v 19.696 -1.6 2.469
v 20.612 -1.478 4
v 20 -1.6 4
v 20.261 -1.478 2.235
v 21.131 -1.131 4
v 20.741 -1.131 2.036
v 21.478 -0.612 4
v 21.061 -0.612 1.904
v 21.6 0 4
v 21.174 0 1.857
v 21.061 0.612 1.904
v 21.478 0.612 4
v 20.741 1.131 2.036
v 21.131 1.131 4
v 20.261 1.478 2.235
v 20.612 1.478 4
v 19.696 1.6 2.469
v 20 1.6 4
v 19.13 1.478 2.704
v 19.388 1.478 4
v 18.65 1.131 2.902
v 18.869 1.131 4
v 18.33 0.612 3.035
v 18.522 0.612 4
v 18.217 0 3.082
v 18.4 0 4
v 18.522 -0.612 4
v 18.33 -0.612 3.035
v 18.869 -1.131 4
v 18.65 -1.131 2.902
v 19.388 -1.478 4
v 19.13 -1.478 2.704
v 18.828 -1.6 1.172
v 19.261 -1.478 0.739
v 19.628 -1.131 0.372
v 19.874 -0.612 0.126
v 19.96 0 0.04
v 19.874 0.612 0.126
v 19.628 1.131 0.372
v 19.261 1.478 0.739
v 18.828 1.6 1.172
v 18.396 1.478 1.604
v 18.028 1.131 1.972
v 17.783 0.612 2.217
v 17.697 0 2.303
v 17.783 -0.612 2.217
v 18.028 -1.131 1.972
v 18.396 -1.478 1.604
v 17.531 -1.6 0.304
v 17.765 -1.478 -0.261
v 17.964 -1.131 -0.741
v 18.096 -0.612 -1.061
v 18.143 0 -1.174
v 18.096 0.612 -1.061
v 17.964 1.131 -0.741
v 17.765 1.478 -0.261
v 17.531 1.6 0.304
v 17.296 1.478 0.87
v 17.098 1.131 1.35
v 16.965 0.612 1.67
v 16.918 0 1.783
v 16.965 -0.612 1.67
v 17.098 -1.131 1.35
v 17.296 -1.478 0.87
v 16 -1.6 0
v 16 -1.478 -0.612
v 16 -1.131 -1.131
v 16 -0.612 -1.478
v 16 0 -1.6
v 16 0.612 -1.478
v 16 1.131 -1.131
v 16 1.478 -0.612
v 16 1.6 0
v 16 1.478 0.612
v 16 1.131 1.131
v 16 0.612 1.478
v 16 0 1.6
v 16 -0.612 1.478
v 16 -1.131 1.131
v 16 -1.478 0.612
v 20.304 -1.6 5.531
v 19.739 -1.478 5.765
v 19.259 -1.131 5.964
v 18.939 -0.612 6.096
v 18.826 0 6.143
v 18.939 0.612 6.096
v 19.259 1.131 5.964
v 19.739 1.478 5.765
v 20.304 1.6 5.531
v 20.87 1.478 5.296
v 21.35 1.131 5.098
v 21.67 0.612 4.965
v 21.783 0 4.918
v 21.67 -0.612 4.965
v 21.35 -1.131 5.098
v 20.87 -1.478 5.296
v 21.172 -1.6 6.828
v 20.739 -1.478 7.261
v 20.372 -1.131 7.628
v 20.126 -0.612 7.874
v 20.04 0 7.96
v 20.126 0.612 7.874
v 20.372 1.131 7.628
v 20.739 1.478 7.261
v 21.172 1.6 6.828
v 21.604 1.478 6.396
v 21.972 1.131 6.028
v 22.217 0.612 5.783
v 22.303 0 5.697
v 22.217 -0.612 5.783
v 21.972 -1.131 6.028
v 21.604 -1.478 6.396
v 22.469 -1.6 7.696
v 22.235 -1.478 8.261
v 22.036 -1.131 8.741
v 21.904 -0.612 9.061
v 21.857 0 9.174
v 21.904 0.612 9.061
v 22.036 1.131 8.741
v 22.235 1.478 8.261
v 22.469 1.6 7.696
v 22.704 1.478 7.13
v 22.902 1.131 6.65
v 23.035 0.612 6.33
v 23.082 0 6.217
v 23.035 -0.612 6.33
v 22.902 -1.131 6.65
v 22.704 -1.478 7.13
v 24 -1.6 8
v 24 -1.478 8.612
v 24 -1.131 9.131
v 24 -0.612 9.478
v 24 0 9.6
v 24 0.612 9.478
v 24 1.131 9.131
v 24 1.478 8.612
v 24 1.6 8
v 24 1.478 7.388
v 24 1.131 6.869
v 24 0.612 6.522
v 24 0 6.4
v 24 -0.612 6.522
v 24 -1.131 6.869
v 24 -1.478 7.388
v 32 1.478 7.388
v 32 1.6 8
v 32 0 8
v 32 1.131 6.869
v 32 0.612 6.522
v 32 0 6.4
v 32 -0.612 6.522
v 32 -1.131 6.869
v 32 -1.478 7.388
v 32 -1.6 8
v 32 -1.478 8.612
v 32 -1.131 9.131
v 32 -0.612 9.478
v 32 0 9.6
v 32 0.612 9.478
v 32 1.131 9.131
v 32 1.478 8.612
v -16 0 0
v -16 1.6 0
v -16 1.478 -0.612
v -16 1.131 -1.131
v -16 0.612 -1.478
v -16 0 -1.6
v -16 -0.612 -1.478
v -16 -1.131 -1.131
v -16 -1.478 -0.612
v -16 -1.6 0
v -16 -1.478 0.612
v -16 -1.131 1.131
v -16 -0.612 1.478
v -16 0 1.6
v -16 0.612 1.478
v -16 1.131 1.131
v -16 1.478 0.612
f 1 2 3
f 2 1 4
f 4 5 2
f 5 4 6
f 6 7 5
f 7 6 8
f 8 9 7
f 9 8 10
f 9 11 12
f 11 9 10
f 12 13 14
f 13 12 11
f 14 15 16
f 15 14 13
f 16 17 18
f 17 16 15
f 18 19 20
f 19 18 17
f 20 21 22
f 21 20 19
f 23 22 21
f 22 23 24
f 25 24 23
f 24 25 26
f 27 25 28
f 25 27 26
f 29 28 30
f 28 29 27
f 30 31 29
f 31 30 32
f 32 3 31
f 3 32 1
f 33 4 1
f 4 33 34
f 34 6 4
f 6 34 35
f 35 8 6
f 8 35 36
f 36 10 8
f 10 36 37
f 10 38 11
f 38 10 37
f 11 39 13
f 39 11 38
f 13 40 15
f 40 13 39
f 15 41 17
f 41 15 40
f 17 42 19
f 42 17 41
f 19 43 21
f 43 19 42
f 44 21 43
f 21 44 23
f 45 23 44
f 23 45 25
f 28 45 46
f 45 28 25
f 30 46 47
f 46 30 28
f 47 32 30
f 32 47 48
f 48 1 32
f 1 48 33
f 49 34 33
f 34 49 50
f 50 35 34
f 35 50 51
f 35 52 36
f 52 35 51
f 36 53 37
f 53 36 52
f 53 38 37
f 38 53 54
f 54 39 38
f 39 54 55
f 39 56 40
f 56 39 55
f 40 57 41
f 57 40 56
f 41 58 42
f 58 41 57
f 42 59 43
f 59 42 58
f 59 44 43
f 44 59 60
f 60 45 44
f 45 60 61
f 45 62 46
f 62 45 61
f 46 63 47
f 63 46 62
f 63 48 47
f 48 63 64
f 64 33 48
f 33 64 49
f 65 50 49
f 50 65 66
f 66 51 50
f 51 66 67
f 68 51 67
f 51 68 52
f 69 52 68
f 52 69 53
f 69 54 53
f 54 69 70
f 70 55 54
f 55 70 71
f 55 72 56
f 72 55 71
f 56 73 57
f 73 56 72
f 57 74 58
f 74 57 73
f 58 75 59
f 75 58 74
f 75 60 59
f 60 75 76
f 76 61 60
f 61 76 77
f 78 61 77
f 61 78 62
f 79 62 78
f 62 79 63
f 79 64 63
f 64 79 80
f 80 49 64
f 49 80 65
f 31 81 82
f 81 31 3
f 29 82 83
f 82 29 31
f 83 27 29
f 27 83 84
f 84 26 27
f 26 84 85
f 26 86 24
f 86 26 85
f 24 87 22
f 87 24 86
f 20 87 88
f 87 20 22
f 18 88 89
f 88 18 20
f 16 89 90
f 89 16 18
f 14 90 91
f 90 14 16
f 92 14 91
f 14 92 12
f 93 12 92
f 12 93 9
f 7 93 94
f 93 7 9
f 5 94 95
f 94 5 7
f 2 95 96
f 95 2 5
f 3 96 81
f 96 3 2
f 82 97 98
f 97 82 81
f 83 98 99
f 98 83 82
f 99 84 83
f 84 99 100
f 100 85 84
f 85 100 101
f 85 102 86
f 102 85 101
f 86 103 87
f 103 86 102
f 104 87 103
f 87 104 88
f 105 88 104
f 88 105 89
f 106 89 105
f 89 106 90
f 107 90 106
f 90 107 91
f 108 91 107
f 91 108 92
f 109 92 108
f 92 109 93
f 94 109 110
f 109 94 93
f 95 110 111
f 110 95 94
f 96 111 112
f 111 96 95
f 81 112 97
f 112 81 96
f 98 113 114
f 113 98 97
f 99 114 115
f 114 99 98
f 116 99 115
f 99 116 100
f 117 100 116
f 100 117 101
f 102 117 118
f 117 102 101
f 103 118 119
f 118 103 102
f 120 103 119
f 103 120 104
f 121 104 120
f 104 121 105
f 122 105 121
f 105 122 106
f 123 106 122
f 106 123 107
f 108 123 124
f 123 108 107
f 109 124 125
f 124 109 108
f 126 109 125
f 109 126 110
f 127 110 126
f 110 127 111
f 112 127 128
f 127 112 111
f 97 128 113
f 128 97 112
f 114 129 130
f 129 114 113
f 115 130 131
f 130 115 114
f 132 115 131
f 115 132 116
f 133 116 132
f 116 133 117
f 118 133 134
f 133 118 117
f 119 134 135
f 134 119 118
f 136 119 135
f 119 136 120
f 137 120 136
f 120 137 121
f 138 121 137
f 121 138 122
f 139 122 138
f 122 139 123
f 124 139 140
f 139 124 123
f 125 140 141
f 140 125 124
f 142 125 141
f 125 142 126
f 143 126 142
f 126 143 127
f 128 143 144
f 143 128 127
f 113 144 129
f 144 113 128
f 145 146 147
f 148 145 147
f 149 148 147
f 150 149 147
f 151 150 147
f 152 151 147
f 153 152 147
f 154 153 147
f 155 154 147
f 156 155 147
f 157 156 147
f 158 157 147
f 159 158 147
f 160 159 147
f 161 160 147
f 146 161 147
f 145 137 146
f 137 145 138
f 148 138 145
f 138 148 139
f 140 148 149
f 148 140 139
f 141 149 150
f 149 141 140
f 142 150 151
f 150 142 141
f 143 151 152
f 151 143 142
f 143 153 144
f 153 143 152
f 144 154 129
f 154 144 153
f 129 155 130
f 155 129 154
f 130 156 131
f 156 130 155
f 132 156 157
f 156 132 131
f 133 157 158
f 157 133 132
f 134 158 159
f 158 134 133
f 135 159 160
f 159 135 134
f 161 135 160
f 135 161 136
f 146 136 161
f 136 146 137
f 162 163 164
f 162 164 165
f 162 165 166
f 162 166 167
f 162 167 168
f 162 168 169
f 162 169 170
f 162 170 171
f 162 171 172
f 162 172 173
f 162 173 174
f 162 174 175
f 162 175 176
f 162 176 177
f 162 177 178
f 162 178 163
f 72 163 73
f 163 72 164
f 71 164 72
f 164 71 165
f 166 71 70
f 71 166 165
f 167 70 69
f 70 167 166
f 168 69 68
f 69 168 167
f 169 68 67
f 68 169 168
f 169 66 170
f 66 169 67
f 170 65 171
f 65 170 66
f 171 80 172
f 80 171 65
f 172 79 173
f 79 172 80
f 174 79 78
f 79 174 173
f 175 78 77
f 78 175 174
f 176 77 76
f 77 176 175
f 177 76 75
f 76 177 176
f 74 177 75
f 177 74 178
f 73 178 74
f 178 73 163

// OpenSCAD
// file: ../p/4-4disc.scad
use <../lib.scad>
function ldraw_lib__4_4disc() = [
// 0 Disc 1.0
// 0 Name: 4-4disc.dat
// 0 Author: James Jessiman
// 0 !LDRAW_ORG Primitive UPDATE 2002-02
// 0 !LICENSE Licensed under CC BY 4.0 : see CAreadme.txt
// 
// 0 BFC CERTIFY CCW
  [0,"BFC","CERTIFY"],
  [0,"BFC","CCW"],
// 
// 0 !HISTORY 1998-12-15 [PTadmin] Official Update 1998-10
// 0 !HISTORY 2002-03-23 [sbliss] Added BFC statement
// 0 !HISTORY 2002-04-25 [PTadmin] Official Update 2002-02
// 0 !HISTORY 2007-06-24 [PTadmin] Header formatted for Contributor Agreement
// 0 !HISTORY 2008-07-01 [PTadmin] Official Update 2008-01
// 
// 
// 3 16 0 0 0 1 0 0 0.9239 0 0.3827
  [3,16,0,0,0,1,0,0,0.9239,0,0.3827],
// 3 16 0 0 0 0.9239 0 0.3827 0.7071 0 0.7071
  [3,16,0,0,0,0.9239,0,0.3827,0.7071,0,0.7071],
// 3 16 0 0 0 0.7071 0 0.7071 0.3827 0 0.9239
  [3,16,0,0,0,0.7071,0,0.7071,0.3827,0,0.9239],
// 3 16 0 0 0 0.3827 0 0.9239 0 0 1
  [3,16,0,0,0,0.3827,0,0.9239,0,0,1],
// 3 16 0 0 0 0 0 1 -0.3827 0 0.9239
  [3,16,0,0,0,0,0,1,-0.3827,0,0.9239],
// 3 16 0 0 0 -0.3827 0 0.9239 -0.7071 0 0.7071
  [3,16,0,0,0,-0.3827,0,0.9239,-0.7071,0,0.7071],
// 3 16 0 0 0 -0.7071 0 0.7071 -0.9239 0 0.3827
  [3,16,0,0,0,-0.7071,0,0.7071,-0.9239,0,0.3827],
// 3 16 0 0 0 -0.9239 0 0.3827 -1 0 -0
  [3,16,0,0,0,-0.9239,0,0.3827,-1,0,-0],
// 3 16 0 0 0 -1 0 -0 -0.9239 0 -0.3827
  [3,16,0,0,0,-1,0,-0,-0.9239,0,-0.3827],
// 3 16 0 0 0 -0.9239 0 -0.3827 -0.7071 0 -0.7071
  [3,16,0,0,0,-0.9239,0,-0.3827,-0.7071,0,-0.7071],
// 3 16 0 0 0 -0.7071 0 -0.7071 -0.3827 0 -0.9239
  [3,16,0,0,0,-0.7071,0,-0.7071,-0.3827,0,-0.9239],
// 3 16 0 0 0 -0.3827 0 -0.9239 0 0 -1
  [3,16,0,0,0,-0.3827,0,-0.9239,0,0,-1],
// 3 16 0 0 0 0 0 -1 0.3827 0 -0.9239
  [3,16,0,0,0,0,0,-1,0.3827,0,-0.9239],
// 3 16 0 0 0 0.3827 0 -0.9239 0.7071 0 -0.7071
  [3,16,0,0,0,0.3827,0,-0.9239,0.7071,0,-0.7071],
// 3 16 0 0 0 0.7071 0 -0.7071 0.9239 0 -0.3827
  [3,16,0,0,0,0.7071,0,-0.7071,0.9239,0,-0.3827],
// 3 16 0 0 0 0.9239 0 -0.3827 1 0 0
  [3,16,0,0,0,0.9239,0,-0.3827,1,0,0],
// 0
];
module ldraw_lib__4_4disc(step=0, col=false, unit=2/5, alt=false, line=0.2, solid=!$preview)
    makepoly(ldraw_lib__4_4disc(), step=step, col=col, unit=unit, alt=alt, line=line, solid=solid);
ldraw_lib__4_4disc(line=0.2);
// file: ../p/4-4cyli.scad
use <../lib.scad>
function ldraw_lib__4_4cyli() = [
// 0 Cylinder 1.0
// 0 Name: 4-4cyli.dat
// 0 Author: James Jessiman
// 0 !LDRAW_ORG Primitive UPDATE 2005-01
// 0 !LICENSE Licensed under CC BY 2.0 and CC BY 4.0 : see CAreadme.txt
// 
// 0 BFC CERTIFY CCW
  [0,"BFC","CERTIFY"],
  [0,"BFC","CCW"],
// 
// 0 !HISTORY 1998-12-15 [PTadmin] Official Update 1998-10
// 0 !HISTORY 2002-03-23 [sbliss] Added BFC statement; merged headers from files in distributions LDraw 0.27 and Complete.
// 0 !HISTORY 2002-04-25 [PTadmin] Official Update 2002-02
// 0 !HISTORY 2004-12-14 [guyvivan] BFC CCW
// 0 !HISTORY 2005-12-28 [PTadmin] Official Update 2005-01
// 0 !HISTORY 2007-06-24 [PTadmin] Header formatted for Contributor Agreement
// 0 !HISTORY 2008-07-01 [PTadmin] Official Update 2008-01
// 
// 
// 4 16 1 1 0 0.9239 1 0.3827 0.9239 0 0.3827 1 0 0
  [4,16,1,1,0,0.9239,1,0.3827,0.9239,0,0.3827,1,0,0],
// 5 24 1 0 0 1 1 0 0.9239 0 0.3827 0.9239 0 -0.3827
  [5,24,1,0,0,1,1,0,0.9239,0,0.3827,0.9239,0,-0.3827],
// 4 16 0.9239 1 0.3827 0.7071 1 0.7071 0.7071 0 0.7071 0.9239 0 0.3827
  [4,16,0.9239,1,0.3827,0.7071,1,0.7071,0.7071,0,0.7071,0.9239,0,0.3827],
// 5 24 0.9239 0 0.3827 0.9239 1 0.3827 0.7071 0 0.7071 1 0 0
  [5,24,0.9239,0,0.3827,0.9239,1,0.3827,0.7071,0,0.7071,1,0,0],
// 4 16 0.7071 1 0.7071 0.3827 1 0.9239 0.3827 0 0.9239 0.7071 0 0.7071
  [4,16,0.7071,1,0.7071,0.3827,1,0.9239,0.3827,0,0.9239,0.7071,0,0.7071],
// 5 24 0.7071 0 0.7071 0.7071 1 0.7071 0.3827 0 0.9239 0.9239 0 0.3827
  [5,24,0.7071,0,0.7071,0.7071,1,0.7071,0.3827,0,0.9239,0.9239,0,0.3827],
// 4 16 0.3827 1 0.9239 0 1 1 0 0 1 0.3827 0 0.9239
  [4,16,0.3827,1,0.9239,0,1,1,0,0,1,0.3827,0,0.9239],
// 5 24 0.3827 0 0.9239 0.3827 1 0.9239 0 0 1 0.7071 0 0.7071
  [5,24,0.3827,0,0.9239,0.3827,1,0.9239,0,0,1,0.7071,0,0.7071],
// 4 16 0 1 1 -0.3827 1 0.9239 -0.3827 0 0.9239 0 0 1
  [4,16,0,1,1,-0.3827,1,0.9239,-0.3827,0,0.9239,0,0,1],
// 5 24 0 0 1 0 1 1 -0.3827 0 0.9239 0.3827 0 0.9239
  [5,24,0,0,1,0,1,1,-0.3827,0,0.9239,0.3827,0,0.9239],
// 4 16 -0.3827 1 0.9239 -0.7071 1 0.7071 -0.7071 0 0.7071 -0.3827 0 0.9239
  [4,16,-0.3827,1,0.9239,-0.7071,1,0.7071,-0.7071,0,0.7071,-0.3827,0,0.9239],
// 5 24 -0.3827 0 0.9239 -0.3827 1 0.9239 -0.7071 0 0.7071 0 0 1
  [5,24,-0.3827,0,0.9239,-0.3827,1,0.9239,-0.7071,0,0.7071,0,0,1],
// 4 16 -0.7071 1 0.7071 -0.9239 1 0.3827 -0.9239 0 0.3827 -0.7071 0 0.7071
  [4,16,-0.7071,1,0.7071,-0.9239,1,0.3827,-0.9239,0,0.3827,-0.7071,0,0.7071],
// 5 24 -0.7071 0 0.7071 -0.7071 1 0.7071 -0.9239 0 0.3827 -0.3827 0 0.9239
  [5,24,-0.7071,0,0.7071,-0.7071,1,0.7071,-0.9239,0,0.3827,-0.3827,0,0.9239],
// 4 16 -0.9239 1 0.3827 -1 1 0 -1 0 0 -0.9239 0 0.3827
  [4,16,-0.9239,1,0.3827,-1,1,0,-1,0,0,-0.9239,0,0.3827],
// 5 24 -0.9239 0 0.3827 -0.9239 1 0.3827 -1 0 0 -0.7071 0 0.7071
  [5,24,-0.9239,0,0.3827,-0.9239,1,0.3827,-1,0,0,-0.7071,0,0.7071],
// 4 16 -1 1 0 -0.9239 1 -0.3827 -0.9239 0 -0.3827 -1 0 0
  [4,16,-1,1,0,-0.9239,1,-0.3827,-0.9239,0,-0.3827,-1,0,0],
// 5 24 -1 0 0 -1 1 0 -0.9239 0 -0.3827 -0.9239 0 0.3827
  [5,24,-1,0,0,-1,1,0,-0.9239,0,-0.3827,-0.9239,0,0.3827],
// 4 16 -0.9239 1 -0.3827 -0.7071 1 -0.7071 -0.7071 0 -0.7071 -0.9239 0 -0.3827
  [4,16,-0.9239,1,-0.3827,-0.7071,1,-0.7071,-0.7071,0,-0.7071,-0.9239,0,-0.3827],
// 5 24 -0.9239 0 -0.3827 -0.9239 1 -0.3827 -0.7071 0 -0.7071 -1 0 0
  [5,24,-0.9239,0,-0.3827,-0.9239,1,-0.3827,-0.7071,0,-0.7071,-1,0,0],
// 4 16 -0.7071 1 -0.7071 -0.3827 1 -0.9239 -0.3827 0 -0.9239 -0.7071 0 -0.7071
  [4,16,-0.7071,1,-0.7071,-0.3827,1,-0.9239,-0.3827,0,-0.9239,-0.7071,0,-0.7071],
// 5 24 -0.7071 0 -0.7071 -0.7071 1 -0.7071 -0.3827 0 -0.9239 -0.9239 0 -0.3827
  [5,24,-0.7071,0,-0.7071,-0.7071,1,-0.7071,-0.3827,0,-0.9239,-0.9239,0,-0.3827],
// 4 16 -0.3827 1 -0.9239 0 1 -1 0 0 -1 -0.3827 0 -0.9239
  [4,16,-0.3827,1,-0.9239,0,1,-1,0,0,-1,-0.3827,0,-0.9239],
// 5 24 -0.3827 0 -0.9239 -0.3827 1 -0.9239 0 0 -1 -0.7071 0 -0.7071
  [5,24,-0.3827,0,-0.9239,-0.3827,1,-0.9239,0,0,-1,-0.7071,0,-0.7071],
// 4 16 0 1 -1 0.3827 1 -0.9239 0.3827 0 -0.9239 0 0 -1
  [4,16,0,1,-1,0.3827,1,-0.9239,0.3827,0,-0.9239,0,0,-1],
// 5 24 0 0 -1 0 1 -1 0.3827 0 -0.9239 -0.3827 0 -0.9239
  [5,24,0,0,-1,0,1,-1,0.3827,0,-0.9239,-0.3827,0,-0.9239],
// 4 16 0.3827 1 -0.9239 0.7071 1 -0.7071 0.7071 0 -0.7071 0.3827 0 -0.9239
  [4,16,0.3827,1,-0.9239,0.7071,1,-0.7071,0.7071,0,-0.7071,0.3827,0,-0.9239],
// 5 24 0.3827 0 -0.9239 0.3827 1 -0.9239 0.7071 0 -0.7071 0 0 -1
  [5,24,0.3827,0,-0.9239,0.3827,1,-0.9239,0.7071,0,-0.7071,0,0,-1],
// 4 16 0.7071 1 -0.7071 0.9239 1 -0.3827 0.9239 0 -0.3827 0.7071 0 -0.7071
  [4,16,0.7071,1,-0.7071,0.9239,1,-0.3827,0.9239,0,-0.3827,0.7071,0,-0.7071],
// 5 24 0.7071 0 -0.7071 0.7071 1 -0.7071 0.9239 0 -0.3827 0.3827 0 -0.9239
  [5,24,0.7071,0,-0.7071,0.7071,1,-0.7071,0.9239,0,-0.3827,0.3827,0,-0.9239],
// 4 16 0.9239 1 -0.3827 1 1 0 1 0 0 0.9239 0 -0.3827
  [4,16,0.9239,1,-0.3827,1,1,0,1,0,0,0.9239,0,-0.3827],
// 5 24 0.9239 0 -0.3827 0.9239 1 -0.3827 1 0 0 0.7071 0 -0.7071
  [5,24,0.9239,0,-0.3827,0.9239,1,-0.3827,1,0,0,0.7071,0,-0.7071],
// 0
];
module ldraw_lib__4_4cyli(step=0, col=false, unit=2/5, alt=false, line=0.2, solid=!$preview)
    makepoly(ldraw_lib__4_4cyli(), step=step, col=col, unit=unit, alt=alt, line=line, solid=solid);
ldraw_lib__4_4cyli(line=0.2);
// file: ../p/4-4edge.scad
use <../lib.scad>
function ldraw_lib__4_4edge() = [
// 0 Circle 1.0
// 0 Name: 4-4edge.dat
// 0 Author: James Jessiman
// 0 !LDRAW_ORG Primitive UPDATE 2017-01
// 0 !LICENSE Licensed under CC BY 4.0 : see CAreadme.txt
// 
// 0 BFC CERTIFY CCW
  [0,"BFC","CERTIFY"],
  [0,"BFC","CCW"],
// 
// 0 !HISTORY 1998-12-15 [PTadmin] Official Update 1998-10
// 0 !HISTORY 2005-12-28 [PTadmin] Official Update 2005-01
// 0 !HISTORY 2007-06-24 [PTadmin] Header formatted for Contributor Agreement
// 0 !HISTORY 2008-07-01 [PTadmin] Official Update 2008-01
// 0 !HISTORY 2017-01-15 [Steffen] BFCed
// 0 !HISTORY 2017-12-30 [PTadmin] Official Update 2017-01
// 
// 
// 2 24 1 0 0 0.9239 0 0.3827
  [2,24,1,0,0,0.9239,0,0.3827],
// 2 24 0.9239 0 0.3827 0.7071 0 0.7071
  [2,24,0.9239,0,0.3827,0.7071,0,0.7071],
// 2 24 0.7071 0 0.7071 0.3827 0 0.9239
  [2,24,0.7071,0,0.7071,0.3827,0,0.9239],
// 2 24 0.3827 0 0.9239 0 0 1
  [2,24,0.3827,0,0.9239,0,0,1],
// 2 24 0 0 1 -0.3827 0 0.9239
  [2,24,0,0,1,-0.3827,0,0.9239],
// 2 24 -0.3827 0 0.9239 -0.7071 0 0.7071
  [2,24,-0.3827,0,0.9239,-0.7071,0,0.7071],
// 2 24 -0.7071 0 0.7071 -0.9239 0 0.3827
  [2,24,-0.7071,0,0.7071,-0.9239,0,0.3827],
// 2 24 -0.9239 0 0.3827 -1 0 -0
  [2,24,-0.9239,0,0.3827,-1,0,-0],
// 2 24 -1 0 -0 -0.9239 0 -0.3827
  [2,24,-1,0,-0,-0.9239,0,-0.3827],
// 2 24 -0.9239 0 -0.3827 -0.7071 0 -0.7071
  [2,24,-0.9239,0,-0.3827,-0.7071,0,-0.7071],
// 2 24 -0.7071 0 -0.7071 -0.3827 0 -0.9239
  [2,24,-0.7071,0,-0.7071,-0.3827,0,-0.9239],
// 2 24 -0.3827 0 -0.9239 0 0 -1
  [2,24,-0.3827,0,-0.9239,0,0,-1],
// 2 24 0 0 -1 0.3827 0 -0.9239
  [2,24,0,0,-1,0.3827,0,-0.9239],
// 2 24 0.3827 0 -0.9239 0.7071 0 -0.7071
  [2,24,0.3827,0,-0.9239,0.7071,0,-0.7071],
// 2 24 0.7071 0 -0.7071 0.9239 0 -0.3827
  [2,24,0.7071,0,-0.7071,0.9239,0,-0.3827],
// 2 24 0.9239 0 -0.3827 1 0 0
  [2,24,0.9239,0,-0.3827,1,0,0],
];
module ldraw_lib__4_4edge(step=0, col=false, unit=2/5, alt=false, line=0.2, solid=!$preview)
    makepoly(ldraw_lib__4_4edge(), step=step, col=col, unit=unit, alt=alt, line=line, solid=solid);
ldraw_lib__4_4edge(line=0.2);
// file: ../p/4-4cylc3.scad
use <../lib.scad>
use <4-4cyli.scad>
use <4-4disc.scad>
function ldraw_lib__4_4cylc3() = [
// 0 Cylinder Closed 1.0 without Top or Bottom Edge Lines
// 0 Name: 4-4cylc3.dat
// 0 Author: Chris Dee [cwdee]
// 0 !LDRAW_ORG Primitive UPDATE 2017-01
// 0 !LICENSE Licensed under CC BY 4.0 : see CAreadme.txt
// 
// 0 BFC CERTIFY CCW
  [0,"BFC","CERTIFY"],
  [0,"BFC","CCW"],
// 
// 0 !HISTORY 2017-12-30 [PTadmin] Official Update 2017-01
// 
// 
// 1 16 0 0 0 1 0 0 0 1 0 0 0 1 4-4disc.dat
  [1,16,0,0,0,1,0,0,0,1,0,0,0,1, ldraw_lib__4_4disc()],
// 1 16 0 0 0 1 0 0 0 1 0 0 0 1 4-4cyli.dat
  [1,16,0,0,0,1,0,0,0,1,0,0,0,1, ldraw_lib__4_4cyli()],
// 0
];
module ldraw_lib__4_4cylc3(step=0, col=false, unit=2/5, alt=false, line=0.2, solid=!$preview)
    makepoly(ldraw_lib__4_4cylc3(), step=step, col=col, unit=unit, alt=alt, line=line, solid=solid);
ldraw_lib__4_4cylc3(line=0.2);
// main file
use <../lib.scad>
use <../p/4-4cylc3.scad>
use <../p/4-4edge.scad>
use <../p/t04q4000.scad>
function ldraw_lib__763() = [
// 0 ~Crank Handle  4 x  1 Metal
// 0 Name: 763.dat
// 0 Author: Michael Heidemann [mikeheide]
// 0 !LDRAW_ORG Part UPDATE 2020-01
// 0 !LICENSE Licensed under CC BY 4.0 : see CAreadme.txt
// 
// 0 BFC CERTIFY CCW
  [0,"BFC","CERTIFY"],
  [0,"BFC","CCW"],
// 
// 0 !CATEGORY Bar
// 
// 0 !HISTORY 2010-04-05 [PTadmin] Official Update 2010-01
// 0 !HISTORY 2020-03-10 [Sirio] Updated the use of primitives
// 0 !HISTORY 2020-06-28 [PTadmin] Official Update 2020-01
// 
// 
// 1 16 40 -10 0 10 0 0 0 0 10 0 -10 0 t04q4000.dat
  [1,16,40,-10,0,10,0,0,0,0,10,0,-10,0, ldraw_lib__t04q4000()],
// 1 16 60 -10 0 -10 0 0 0 0 -10 0 -10 0 t04q4000.dat
  [1,16,60,-10,0,-10,0,0,0,0,-10,0,-10,0, ldraw_lib__t04q4000()],
// 1 16 80 -20 0 0 -20 0 0 0 4 4 0 0 4-4cylc3.dat
  [1,16,80,-20,0,0,-20,0,0,0,4,4,0,0, ldraw_lib__4_4cylc3()],
// 1 16 -40 0 0 0 80 0 0 0 4 4 0 0 4-4cylc3.dat
  [1,16,-40,0,0,0,80,0,0,0,4,4,0,0, ldraw_lib__4_4cylc3()],
// 1 16 80 -20 0 0 1 0 0 0 4 4 0 0 4-4edge.dat
  [1,16,80,-20,0,0,1,0,0,0,4,4,0,0, ldraw_lib__4_4edge()],
// 1 16 -40 0 0 0 1 0 0 0 4 4 0 0 4-4edge.dat
  [1,16,-40,0,0,0,1,0,0,0,4,4,0,0, ldraw_lib__4_4edge()],
];
module ldraw_lib__763(step=0, col=false, unit=2/5, alt=false, line=0.2, solid=!$preview)
    makepoly(ldraw_lib__763(), step=step, col=col, unit=unit, alt=alt, line=line, solid=solid);
ldraw_lib__763(line=0.2);
